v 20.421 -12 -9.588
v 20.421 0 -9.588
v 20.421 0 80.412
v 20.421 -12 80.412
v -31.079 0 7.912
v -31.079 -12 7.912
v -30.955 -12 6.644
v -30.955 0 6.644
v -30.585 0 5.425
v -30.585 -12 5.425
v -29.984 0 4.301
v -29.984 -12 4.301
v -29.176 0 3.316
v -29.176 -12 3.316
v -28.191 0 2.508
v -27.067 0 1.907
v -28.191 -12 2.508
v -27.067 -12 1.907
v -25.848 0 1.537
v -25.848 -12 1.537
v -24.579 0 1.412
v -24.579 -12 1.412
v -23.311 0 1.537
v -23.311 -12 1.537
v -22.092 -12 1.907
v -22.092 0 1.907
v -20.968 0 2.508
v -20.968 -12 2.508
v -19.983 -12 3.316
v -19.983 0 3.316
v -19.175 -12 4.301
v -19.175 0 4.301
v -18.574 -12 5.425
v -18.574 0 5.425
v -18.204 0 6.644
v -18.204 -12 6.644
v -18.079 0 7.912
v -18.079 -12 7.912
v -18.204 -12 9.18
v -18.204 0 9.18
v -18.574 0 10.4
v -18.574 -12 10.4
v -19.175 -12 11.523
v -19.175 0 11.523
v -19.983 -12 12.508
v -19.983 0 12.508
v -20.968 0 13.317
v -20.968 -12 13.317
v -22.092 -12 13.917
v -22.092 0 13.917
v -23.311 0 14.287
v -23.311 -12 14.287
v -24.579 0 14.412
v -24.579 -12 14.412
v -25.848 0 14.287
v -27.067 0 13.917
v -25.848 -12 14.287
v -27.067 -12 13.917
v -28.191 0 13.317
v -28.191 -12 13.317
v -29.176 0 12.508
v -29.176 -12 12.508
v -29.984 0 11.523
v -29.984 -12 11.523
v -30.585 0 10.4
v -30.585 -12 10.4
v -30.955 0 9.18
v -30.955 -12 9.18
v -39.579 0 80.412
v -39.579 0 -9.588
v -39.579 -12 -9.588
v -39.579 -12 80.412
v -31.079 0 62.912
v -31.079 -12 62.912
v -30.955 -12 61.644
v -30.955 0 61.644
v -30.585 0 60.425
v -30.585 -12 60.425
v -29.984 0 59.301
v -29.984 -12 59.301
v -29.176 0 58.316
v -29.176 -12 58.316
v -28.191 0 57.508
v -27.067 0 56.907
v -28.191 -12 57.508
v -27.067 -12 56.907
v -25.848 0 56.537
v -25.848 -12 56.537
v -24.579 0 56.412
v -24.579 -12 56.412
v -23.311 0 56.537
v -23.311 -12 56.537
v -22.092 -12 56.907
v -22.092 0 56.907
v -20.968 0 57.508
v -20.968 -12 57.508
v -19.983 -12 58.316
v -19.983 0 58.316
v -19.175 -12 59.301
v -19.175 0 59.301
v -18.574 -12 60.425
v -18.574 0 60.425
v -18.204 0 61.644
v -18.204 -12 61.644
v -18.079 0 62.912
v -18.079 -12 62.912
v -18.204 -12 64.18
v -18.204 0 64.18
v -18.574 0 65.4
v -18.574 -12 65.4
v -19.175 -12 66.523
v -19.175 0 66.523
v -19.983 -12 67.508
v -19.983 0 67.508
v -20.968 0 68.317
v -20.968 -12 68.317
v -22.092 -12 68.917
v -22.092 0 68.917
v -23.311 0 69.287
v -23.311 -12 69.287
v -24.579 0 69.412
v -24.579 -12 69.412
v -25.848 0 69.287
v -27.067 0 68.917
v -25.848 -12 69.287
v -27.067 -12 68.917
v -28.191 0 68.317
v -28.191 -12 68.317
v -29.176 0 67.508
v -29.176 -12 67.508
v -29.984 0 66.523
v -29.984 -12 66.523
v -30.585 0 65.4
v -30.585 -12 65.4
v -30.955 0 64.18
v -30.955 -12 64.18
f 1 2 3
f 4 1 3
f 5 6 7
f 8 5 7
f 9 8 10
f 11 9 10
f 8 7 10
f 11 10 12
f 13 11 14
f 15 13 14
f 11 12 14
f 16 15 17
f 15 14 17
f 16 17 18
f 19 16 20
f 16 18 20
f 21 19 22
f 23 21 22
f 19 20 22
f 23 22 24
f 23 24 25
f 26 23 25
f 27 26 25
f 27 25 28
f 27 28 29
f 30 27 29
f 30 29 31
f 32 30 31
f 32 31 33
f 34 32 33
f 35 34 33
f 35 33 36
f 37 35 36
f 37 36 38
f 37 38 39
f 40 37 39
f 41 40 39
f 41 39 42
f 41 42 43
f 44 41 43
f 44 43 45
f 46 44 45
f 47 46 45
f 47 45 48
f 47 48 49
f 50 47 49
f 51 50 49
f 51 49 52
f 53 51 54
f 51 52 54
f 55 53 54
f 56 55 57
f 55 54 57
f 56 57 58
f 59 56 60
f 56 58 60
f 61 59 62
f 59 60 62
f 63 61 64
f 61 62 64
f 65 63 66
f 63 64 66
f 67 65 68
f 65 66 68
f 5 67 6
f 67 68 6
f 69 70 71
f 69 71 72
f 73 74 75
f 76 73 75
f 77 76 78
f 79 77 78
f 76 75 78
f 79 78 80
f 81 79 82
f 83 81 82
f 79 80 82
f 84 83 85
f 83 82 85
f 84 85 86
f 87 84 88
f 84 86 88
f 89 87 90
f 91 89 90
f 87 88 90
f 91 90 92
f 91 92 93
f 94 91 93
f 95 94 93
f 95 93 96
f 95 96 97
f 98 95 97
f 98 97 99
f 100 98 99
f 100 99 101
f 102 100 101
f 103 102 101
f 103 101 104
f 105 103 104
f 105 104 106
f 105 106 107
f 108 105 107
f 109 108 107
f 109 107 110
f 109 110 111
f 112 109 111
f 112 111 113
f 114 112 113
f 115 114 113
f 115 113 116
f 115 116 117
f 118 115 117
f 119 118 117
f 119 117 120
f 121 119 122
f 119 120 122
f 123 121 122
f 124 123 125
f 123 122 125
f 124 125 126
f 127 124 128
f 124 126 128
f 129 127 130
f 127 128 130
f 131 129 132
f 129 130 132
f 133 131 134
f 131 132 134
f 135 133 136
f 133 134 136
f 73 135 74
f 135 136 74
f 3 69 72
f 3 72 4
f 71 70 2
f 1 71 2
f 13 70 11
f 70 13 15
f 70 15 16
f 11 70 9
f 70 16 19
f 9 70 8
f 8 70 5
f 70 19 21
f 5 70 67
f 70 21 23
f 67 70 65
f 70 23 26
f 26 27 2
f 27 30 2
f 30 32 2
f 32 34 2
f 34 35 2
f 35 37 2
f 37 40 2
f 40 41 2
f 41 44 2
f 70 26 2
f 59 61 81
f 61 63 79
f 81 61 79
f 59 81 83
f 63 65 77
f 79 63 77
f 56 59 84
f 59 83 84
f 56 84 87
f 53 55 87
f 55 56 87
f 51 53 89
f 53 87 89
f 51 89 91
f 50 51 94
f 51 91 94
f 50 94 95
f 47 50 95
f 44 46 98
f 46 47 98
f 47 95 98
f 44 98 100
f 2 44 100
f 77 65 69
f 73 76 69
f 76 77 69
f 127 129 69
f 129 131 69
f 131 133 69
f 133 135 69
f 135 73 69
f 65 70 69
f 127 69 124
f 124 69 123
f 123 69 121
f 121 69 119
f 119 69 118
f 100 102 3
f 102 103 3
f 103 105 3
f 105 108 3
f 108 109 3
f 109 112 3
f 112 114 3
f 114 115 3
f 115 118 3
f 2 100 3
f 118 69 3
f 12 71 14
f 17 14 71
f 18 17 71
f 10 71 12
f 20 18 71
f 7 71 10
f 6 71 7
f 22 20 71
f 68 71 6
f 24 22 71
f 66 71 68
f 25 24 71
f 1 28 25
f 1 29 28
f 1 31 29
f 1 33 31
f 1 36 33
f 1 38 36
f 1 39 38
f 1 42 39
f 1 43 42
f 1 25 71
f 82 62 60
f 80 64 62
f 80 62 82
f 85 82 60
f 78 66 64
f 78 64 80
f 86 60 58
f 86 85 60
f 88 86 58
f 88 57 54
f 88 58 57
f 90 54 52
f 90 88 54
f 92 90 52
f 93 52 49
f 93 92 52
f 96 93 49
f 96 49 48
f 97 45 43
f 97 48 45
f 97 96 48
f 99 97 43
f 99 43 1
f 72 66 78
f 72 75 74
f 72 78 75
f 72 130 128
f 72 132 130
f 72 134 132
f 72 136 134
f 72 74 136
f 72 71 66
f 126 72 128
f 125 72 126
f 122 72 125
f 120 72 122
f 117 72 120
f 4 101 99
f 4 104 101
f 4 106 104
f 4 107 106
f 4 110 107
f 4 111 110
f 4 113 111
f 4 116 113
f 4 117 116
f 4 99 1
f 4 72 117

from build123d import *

# Parameters (mm, degrees)
F0_W     = 60
F0_H     = 90
F1_DEPTH = 12
F2_D     = 13


with BuildPart() as f1:
    # F0 (on Front) → F1 (new body)
    with BuildSketch(Plane.XZ):
        with Locations((-9.5794885419, 35.4121185594)):
            Rectangle(F0_W, F0_H)
    extrude(amount=F1_DEPTH)

    # F2 (through all)
    with Locations(Plane(origin=(0, 0, 0), x_dir=(1, 0, 0), z_dir=(0, 1, 0))):
        with Locations((-24.5794885419, -62.9121185594), (-24.5794885419, -7.9121185594)):
            Hole(F2_D / 2)


solid = f1.part
